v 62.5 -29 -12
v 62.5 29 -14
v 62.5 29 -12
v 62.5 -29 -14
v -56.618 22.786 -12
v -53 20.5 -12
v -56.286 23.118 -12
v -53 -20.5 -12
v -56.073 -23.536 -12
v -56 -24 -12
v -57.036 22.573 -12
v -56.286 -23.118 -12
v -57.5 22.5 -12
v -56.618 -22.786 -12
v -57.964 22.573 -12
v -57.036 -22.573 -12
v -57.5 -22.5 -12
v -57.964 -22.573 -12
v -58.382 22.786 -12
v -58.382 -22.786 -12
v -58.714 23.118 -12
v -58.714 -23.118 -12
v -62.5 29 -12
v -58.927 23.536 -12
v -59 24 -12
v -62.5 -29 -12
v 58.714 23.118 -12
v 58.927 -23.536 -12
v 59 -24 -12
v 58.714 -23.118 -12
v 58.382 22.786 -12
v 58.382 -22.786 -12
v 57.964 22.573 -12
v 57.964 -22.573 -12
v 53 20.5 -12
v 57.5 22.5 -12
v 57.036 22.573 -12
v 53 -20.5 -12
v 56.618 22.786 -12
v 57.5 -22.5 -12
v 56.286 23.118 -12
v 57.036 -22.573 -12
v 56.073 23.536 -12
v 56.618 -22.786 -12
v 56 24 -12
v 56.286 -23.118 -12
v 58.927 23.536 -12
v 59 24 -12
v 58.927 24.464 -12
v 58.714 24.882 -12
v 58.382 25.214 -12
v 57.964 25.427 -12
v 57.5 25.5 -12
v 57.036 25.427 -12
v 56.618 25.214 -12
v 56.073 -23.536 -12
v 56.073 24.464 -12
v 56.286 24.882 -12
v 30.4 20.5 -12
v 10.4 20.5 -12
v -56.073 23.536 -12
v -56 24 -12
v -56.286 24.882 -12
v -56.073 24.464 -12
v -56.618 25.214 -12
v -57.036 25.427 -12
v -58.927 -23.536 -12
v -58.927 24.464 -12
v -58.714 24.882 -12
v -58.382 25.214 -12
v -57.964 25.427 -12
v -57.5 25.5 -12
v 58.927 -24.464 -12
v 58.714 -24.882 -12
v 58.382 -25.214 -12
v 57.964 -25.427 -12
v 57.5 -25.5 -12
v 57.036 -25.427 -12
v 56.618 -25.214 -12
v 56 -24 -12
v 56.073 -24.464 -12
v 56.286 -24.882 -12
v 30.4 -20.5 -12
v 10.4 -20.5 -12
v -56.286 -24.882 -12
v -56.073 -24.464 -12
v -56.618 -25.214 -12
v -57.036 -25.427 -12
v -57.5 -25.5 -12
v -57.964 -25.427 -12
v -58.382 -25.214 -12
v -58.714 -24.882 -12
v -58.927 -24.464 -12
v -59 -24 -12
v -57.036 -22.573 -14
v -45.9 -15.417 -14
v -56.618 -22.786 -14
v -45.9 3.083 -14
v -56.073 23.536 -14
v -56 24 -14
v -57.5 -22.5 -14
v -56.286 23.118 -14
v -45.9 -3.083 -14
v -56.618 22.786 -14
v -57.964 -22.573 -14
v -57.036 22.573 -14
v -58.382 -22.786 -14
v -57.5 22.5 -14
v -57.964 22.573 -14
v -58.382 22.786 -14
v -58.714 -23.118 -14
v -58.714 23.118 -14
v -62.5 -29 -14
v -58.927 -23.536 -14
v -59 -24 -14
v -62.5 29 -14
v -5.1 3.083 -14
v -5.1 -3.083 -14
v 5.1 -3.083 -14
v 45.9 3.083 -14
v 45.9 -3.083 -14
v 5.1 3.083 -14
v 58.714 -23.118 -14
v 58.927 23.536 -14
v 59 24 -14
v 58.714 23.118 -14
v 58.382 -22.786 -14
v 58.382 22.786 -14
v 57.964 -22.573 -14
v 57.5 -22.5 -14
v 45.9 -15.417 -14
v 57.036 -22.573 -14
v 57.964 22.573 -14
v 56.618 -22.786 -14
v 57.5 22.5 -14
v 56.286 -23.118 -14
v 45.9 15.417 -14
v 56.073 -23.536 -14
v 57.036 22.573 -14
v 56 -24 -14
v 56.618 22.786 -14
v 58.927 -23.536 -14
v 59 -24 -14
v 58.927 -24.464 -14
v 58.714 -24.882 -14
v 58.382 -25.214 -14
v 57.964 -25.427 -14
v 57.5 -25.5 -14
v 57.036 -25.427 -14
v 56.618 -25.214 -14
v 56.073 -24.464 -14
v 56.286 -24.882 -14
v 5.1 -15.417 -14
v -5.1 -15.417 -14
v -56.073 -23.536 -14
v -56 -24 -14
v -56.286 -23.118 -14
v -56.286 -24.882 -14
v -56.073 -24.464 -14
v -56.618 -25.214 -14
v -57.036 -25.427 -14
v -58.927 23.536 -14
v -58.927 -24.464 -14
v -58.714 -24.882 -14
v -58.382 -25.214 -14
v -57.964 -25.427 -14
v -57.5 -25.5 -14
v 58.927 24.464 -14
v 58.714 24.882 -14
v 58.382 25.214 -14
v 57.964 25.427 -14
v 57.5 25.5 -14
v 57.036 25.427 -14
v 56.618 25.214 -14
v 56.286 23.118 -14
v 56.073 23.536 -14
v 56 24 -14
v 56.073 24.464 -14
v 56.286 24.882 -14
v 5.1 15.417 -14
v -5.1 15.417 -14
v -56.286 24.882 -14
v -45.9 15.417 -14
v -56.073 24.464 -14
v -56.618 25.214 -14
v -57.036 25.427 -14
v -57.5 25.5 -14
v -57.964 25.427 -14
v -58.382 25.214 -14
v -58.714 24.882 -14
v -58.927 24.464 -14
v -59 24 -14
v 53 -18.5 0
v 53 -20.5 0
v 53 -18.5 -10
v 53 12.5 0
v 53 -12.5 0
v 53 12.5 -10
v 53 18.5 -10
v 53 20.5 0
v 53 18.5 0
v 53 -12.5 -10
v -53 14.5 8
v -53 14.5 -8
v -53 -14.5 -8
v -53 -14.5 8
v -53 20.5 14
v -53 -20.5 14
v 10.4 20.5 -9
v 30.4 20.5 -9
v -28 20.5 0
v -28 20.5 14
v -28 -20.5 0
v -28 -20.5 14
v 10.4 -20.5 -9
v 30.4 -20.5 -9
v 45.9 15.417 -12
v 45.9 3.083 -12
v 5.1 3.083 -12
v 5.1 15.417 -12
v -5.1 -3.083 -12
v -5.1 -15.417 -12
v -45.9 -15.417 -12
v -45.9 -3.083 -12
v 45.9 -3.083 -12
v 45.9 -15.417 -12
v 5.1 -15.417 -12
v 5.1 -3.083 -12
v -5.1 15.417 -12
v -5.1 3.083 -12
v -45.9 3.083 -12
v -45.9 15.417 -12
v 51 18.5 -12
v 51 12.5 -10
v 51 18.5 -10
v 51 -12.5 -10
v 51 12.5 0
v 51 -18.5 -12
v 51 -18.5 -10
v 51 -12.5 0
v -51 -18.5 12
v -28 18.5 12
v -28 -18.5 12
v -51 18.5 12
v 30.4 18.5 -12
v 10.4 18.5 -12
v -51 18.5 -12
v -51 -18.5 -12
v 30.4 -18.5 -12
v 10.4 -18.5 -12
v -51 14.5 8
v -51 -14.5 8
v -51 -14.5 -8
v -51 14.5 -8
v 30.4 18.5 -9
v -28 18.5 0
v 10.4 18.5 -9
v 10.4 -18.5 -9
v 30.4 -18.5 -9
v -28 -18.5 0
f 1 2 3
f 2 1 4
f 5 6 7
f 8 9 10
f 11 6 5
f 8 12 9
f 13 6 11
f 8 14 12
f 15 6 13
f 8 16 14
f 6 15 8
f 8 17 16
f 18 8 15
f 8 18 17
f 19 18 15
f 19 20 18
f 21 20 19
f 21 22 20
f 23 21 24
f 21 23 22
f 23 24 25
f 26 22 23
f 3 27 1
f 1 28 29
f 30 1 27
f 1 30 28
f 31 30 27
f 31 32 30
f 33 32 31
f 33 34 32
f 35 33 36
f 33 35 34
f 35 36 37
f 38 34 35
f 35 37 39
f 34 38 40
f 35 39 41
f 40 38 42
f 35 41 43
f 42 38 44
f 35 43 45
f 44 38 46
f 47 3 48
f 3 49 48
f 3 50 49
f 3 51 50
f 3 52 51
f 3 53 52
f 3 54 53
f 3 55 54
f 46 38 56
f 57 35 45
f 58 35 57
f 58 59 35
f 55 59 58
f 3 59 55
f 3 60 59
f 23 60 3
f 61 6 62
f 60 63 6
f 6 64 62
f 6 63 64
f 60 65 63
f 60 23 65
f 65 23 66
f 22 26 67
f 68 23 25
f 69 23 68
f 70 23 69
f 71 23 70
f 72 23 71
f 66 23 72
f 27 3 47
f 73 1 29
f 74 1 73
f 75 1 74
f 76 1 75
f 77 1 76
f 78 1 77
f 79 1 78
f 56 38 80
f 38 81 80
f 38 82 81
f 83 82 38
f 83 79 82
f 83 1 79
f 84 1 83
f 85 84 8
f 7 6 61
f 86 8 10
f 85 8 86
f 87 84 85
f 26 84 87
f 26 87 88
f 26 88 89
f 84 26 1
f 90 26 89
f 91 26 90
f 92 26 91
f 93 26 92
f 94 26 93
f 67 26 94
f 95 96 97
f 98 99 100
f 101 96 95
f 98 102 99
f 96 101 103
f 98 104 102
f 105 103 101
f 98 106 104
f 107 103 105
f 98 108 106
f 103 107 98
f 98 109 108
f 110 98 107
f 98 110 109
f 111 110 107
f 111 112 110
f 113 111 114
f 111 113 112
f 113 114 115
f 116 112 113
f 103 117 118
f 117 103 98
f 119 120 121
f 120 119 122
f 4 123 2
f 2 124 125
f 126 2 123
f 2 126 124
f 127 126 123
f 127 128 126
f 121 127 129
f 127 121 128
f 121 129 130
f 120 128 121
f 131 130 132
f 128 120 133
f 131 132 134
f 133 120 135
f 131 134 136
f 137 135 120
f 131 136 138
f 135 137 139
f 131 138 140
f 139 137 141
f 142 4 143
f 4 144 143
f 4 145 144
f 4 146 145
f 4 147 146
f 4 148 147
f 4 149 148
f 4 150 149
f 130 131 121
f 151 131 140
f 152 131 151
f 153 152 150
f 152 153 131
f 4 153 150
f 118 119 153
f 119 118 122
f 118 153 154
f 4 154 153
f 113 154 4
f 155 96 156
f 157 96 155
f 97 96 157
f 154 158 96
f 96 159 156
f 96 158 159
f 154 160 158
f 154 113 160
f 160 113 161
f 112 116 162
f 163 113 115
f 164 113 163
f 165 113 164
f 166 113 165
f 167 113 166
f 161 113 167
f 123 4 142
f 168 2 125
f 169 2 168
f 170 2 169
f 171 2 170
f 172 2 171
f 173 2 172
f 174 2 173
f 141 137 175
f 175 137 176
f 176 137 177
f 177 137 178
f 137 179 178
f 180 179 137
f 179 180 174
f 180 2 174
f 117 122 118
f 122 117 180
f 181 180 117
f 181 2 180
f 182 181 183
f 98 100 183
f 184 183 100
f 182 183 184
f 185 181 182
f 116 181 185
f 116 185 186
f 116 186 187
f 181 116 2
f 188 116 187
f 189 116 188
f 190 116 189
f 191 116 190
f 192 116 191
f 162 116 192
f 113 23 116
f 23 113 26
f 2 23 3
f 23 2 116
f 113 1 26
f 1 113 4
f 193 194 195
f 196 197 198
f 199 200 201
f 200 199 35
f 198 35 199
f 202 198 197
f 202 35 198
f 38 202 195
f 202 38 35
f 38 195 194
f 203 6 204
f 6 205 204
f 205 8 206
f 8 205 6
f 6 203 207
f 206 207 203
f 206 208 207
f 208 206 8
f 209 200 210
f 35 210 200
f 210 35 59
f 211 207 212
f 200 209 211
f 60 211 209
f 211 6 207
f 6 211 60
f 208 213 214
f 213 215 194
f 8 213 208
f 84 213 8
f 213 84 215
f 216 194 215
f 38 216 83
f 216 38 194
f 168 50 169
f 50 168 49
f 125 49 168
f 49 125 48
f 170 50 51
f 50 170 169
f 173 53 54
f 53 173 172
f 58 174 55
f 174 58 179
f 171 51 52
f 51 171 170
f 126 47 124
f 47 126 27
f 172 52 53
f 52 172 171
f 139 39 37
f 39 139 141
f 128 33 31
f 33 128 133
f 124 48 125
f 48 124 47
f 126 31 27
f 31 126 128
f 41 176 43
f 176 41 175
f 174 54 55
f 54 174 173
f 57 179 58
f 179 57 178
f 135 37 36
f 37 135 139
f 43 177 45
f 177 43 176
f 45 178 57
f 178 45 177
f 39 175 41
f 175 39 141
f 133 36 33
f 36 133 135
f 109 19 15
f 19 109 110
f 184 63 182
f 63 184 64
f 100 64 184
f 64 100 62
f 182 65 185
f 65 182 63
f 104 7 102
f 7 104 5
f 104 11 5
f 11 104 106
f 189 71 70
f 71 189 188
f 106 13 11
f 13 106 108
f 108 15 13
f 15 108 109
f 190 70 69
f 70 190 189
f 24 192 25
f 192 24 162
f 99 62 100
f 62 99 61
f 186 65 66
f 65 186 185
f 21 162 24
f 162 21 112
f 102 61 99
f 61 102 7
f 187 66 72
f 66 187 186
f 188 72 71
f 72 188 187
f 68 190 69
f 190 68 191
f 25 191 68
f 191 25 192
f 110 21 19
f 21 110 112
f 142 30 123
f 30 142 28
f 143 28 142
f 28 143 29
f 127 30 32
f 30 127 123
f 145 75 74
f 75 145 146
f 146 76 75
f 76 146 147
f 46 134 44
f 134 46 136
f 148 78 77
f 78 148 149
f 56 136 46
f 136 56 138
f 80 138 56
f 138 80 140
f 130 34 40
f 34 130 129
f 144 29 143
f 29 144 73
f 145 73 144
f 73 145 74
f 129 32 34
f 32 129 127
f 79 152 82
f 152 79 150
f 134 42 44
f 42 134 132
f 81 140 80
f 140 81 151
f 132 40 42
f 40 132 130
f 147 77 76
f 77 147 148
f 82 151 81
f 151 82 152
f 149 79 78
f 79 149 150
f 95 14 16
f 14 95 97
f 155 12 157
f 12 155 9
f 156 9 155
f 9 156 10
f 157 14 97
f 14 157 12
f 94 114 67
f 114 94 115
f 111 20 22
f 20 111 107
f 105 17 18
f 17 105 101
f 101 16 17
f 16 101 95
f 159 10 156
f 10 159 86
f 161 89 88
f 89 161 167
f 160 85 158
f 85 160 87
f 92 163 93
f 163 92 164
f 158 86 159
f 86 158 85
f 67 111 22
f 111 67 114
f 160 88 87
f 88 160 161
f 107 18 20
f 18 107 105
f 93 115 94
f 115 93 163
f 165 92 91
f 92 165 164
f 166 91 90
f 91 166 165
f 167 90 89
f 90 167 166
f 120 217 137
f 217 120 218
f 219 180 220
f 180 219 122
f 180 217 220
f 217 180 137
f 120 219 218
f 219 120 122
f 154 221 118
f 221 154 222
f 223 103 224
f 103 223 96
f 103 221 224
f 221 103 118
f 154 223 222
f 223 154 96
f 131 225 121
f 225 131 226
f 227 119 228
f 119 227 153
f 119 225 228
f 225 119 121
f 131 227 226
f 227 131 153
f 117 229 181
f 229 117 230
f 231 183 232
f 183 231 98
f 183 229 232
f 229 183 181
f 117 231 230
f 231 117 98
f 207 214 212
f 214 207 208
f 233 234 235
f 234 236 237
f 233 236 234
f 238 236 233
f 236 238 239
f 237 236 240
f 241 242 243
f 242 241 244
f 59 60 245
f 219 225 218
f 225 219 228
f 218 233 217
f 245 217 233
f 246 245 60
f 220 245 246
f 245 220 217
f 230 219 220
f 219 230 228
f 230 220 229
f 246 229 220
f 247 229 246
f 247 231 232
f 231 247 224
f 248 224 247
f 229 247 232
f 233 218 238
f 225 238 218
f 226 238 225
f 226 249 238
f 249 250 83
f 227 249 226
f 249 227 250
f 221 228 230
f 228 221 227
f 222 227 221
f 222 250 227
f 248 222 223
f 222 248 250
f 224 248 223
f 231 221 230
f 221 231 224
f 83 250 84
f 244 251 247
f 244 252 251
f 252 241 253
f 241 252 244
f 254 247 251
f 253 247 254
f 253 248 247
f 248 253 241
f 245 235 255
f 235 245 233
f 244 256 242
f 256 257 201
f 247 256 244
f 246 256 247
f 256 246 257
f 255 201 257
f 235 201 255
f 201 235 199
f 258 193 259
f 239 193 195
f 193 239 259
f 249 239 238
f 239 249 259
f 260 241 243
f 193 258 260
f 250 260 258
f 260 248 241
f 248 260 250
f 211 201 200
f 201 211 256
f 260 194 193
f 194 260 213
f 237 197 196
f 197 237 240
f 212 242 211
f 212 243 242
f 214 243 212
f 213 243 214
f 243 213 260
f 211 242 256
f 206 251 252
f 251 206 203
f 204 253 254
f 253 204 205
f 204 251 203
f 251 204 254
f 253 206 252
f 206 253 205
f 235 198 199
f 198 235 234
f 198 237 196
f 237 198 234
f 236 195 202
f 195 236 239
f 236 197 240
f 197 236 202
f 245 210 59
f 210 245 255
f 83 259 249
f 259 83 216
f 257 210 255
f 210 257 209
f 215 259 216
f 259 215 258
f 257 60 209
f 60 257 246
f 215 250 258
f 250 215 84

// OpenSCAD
battery_length=102;
battery_height=24;
battery_width=37;
// high is not be tested it can be it will not fit in!
wall_height=2; // [3:low,2:medium,1.5:!high!]
thickness=2; // [1:3]
hole= 3; // [0:8]
sunk_screws=0; // [0:NO, 1:YES]
light=1; // [0:NO, 1:YES]
band_hole=1; // [0:NO, 1:YES]
thick_edge=0; // [0:NO, 1:YES]
//If you don't need it set to 0
mount_basis_length= 125;
//If you don't need it set to 0
mount_basis_width= 58;
mount_basis_thickness= 2; // [1:3]
//mount_basis_length need to be higher than
mb_hole_distance_length= 115;
//mount_basis_width need to be higher than
mb_hole_distance_width= 48;


module Akku(){
cube([battery_length,battery_width,battery_height],center=true);
}


module Case(L,B,H)
{
difference(){
cube([L,B,H],center=true);
Akku();


if(battery_length > 100)
{
translate([25,0,thickness+battery_height/wall_height]){
cube([L,B+0.5,H],center=true);
}
} else {
translate([battery_length/4,0,thickness+battery_height/wall_height]){
cube([L,B+0.5,H],center=true);
}
}

if(light==1)
{
translate([-L/2,0,0])
{
cube([L,battery_width-thickness*4,battery_height-thickness*4],center=true);
}
}



translate([L/2,battery_width/2-thickness*1.5,0])
{
cube([L,thickness*3,battery_height-thickness*2],center=true);
}
translate([L/2,-battery_width/2+thickness*1.5,0])
{
cube([L,thickness*3,battery_height-thickness*2],center=true);
}



if(thick_edge==1)
{
if(battery_length/5 > 20)
{
translate([battery_length,battery_width/2,0])
{
cube([battery_length+20,thickness*3,battery_height-thickness*2],center=true);
}
translate([battery_length,-battery_width/2,0])
{
cube([battery_length+20,thickness*3,battery_height-thickness*2],center=true);
}
} else{
translate([battery_length,battery_width/2,0])
{
cube([battery_length+battery_length/5,thickness*3,battery_height-thickness*2],center=true);
}
translate([battery_length,-battery_width/2,0])
{
cube([battery_length+battery_length/5,thickness*3,battery_height-thickness*2],center=true);
}
}
}



if(band_hole==1)
{
translate([battery_length/5,0,-battery_height/2+1.5])
{
if(battery_length > 60)
{
cube([20,battery_width+thickness*2+1,3],center=true);
} else {
cube([battery_length/3,battery_width+thickness*2+1,3],center=true);
}
}
}




if(light==1&&mb_hole_distance_length>battery_length+thickness*2||light==1&&mb_hole_distance_width>battery_width+thickness*2)
{
translate([battery_length/4,battery_width/4,-battery_height/2-0.1])
{
cube([battery_length/2.5,battery_width/3,thickness*2],center=true);
}
translate([-battery_length/4,-battery_width/4,-battery_height/2-0.1])
{
cube([battery_length/2.5,battery_width/3,thickness*2],center=true);
}
translate([battery_length/4,-battery_width/4,-battery_height/2-0.1])
{
cube([battery_length/2.5,battery_width/3,thickness*2],center=true);
}
translate([-battery_length/4,battery_width/4,-battery_height/2-0.1])
{
cube([battery_length/2.5,battery_width/3,thickness*2],center=true);
}
}else{
translate([mb_hole_distance_length/2,mb_hole_distance_width/2,(-battery_height-thickness*2)/2+mount_basis_thickness/2])
{
cylinder(d=hole,h=mount_basis_thickness*2,$fn=20,center=true);
}
translate([-mb_hole_distance_length/2,mb_hole_distance_width/2,(-battery_height-thickness*2)/2+mount_basis_thickness/2])
{
cylinder(d=hole,h=mount_basis_thickness*2,$fn=20,center=true);
}
translate([mb_hole_distance_length/2,-mb_hole_distance_width/2,(-battery_height-thickness*2)/2+mount_basis_thickness/2])
{
cylinder(d=hole,h=mount_basis_thickness*2,$fn=20,center=true);
}
translate([-mb_hole_distance_length/2,-mb_hole_distance_width/2,(-battery_height-thickness*2)/2+mount_basis_thickness/2])
{
cylinder(d=hole,h=mount_basis_thickness*2,$fn=20,center=true);
}
if(sunk_screws==1)
{
translate([mb_hole_distance_length/2,mb_hole_distance_width/2,(-battery_height-thickness*2)/2+mount_basis_thickness-hole/4])
{
cylinder(d1=hole,d2=hole*2,h=hole/2,$fn=20,center=true);
}
translate([-mb_hole_distance_length/2,mb_hole_distance_width/2,(-battery_height-thickness*2)/2+mount_basis_thickness-hole/4])
{
cylinder(d1=hole,d2=hole*2,h=hole/2,$fn=20,center=true);
}
translate([mb_hole_distance_length/2,-mb_hole_distance_width/2,(-battery_height-thickness*2)/2+mount_basis_thickness-hole/4])
{
cylinder(d1=hole,d2=hole*2,h=hole/2,$fn=20,center=true);
}
translate([-mb_hole_distance_length/2,-mb_hole_distance_width/2,(-battery_height-thickness*2)/2+mount_basis_thickness-hole/4])
{
cylinder(d1=hole,d2=hole*2,h=hole/2,$fn=20,center=true);
}
}    
}   
}
}






difference(){
translate([0,0,(-battery_height-thickness*2)/2+mount_basis_thickness/2])
{
cube([mount_basis_length,mount_basis_width,mount_basis_thickness],center=true);
}
translate([0,0,(-battery_height-thickness*2)/2+mount_basis_thickness/2])
{
cube([battery_length+thickness*2,battery_width+thickness*2,battery_height+thickness*2],center=true);
}



translate([mb_hole_distance_length/2,mb_hole_distance_width/2,(-battery_height-thickness*2)/2+mount_basis_thickness/2])
{
cylinder(d=hole,h=mount_basis_thickness*2,$fn=20,center=true);
}
translate([-mb_hole_distance_length/2,mb_hole_distance_width/2,(-battery_height-thickness*2)/2+mount_basis_thickness/2])
{
cylinder(d=hole,h=mount_basis_thickness*2,$fn=20,center=true);
}
translate([mb_hole_distance_length/2,-mb_hole_distance_width/2,(-battery_height-thickness*2)/2+mount_basis_thickness/2])
{
cylinder(d=hole,h=mount_basis_thickness*2,$fn=20,center=true);
}
translate([-mb_hole_distance_length/2,-mb_hole_distance_width/2,(-battery_height-thickness*2)/2+mount_basis_thickness/2])
{
cylinder(d=hole,h=mount_basis_thickness*2,$fn=20,center=true);
}





if(sunk_screws==1)
{
translate([mb_hole_distance_length/2,mb_hole_distance_width/2,(-battery_height-thickness*2)/2+mount_basis_thickness-hole/4])
{
cylinder(d1=hole,d2=hole*2,h=hole/2,$fn=20,center=true);
}
translate([-mb_hole_distance_length/2,mb_hole_distance_width/2,(-battery_height-thickness*2)/2+mount_basis_thickness-hole/4])
{
cylinder(d1=hole,d2=hole*2,h=hole/2,$fn=20,center=true);
}
translate([mb_hole_distance_length/2,-mb_hole_distance_width/2,(-battery_height-thickness*2)/2+mount_basis_thickness-hole/4])
{
cylinder(d1=hole,d2=hole*2,h=hole/2,$fn=20,center=true);
}
translate([-mb_hole_distance_length/2,-mb_hole_distance_width/2,(-battery_height-thickness*2)/2+mount_basis_thickness-hole/4])
{
cylinder(d1=hole,d2=hole*2,h=hole/2,$fn=20,center=true);
}
}
}




Case(battery_length+thickness*2,battery_width+thickness*2,battery_height+thickness*2); 



